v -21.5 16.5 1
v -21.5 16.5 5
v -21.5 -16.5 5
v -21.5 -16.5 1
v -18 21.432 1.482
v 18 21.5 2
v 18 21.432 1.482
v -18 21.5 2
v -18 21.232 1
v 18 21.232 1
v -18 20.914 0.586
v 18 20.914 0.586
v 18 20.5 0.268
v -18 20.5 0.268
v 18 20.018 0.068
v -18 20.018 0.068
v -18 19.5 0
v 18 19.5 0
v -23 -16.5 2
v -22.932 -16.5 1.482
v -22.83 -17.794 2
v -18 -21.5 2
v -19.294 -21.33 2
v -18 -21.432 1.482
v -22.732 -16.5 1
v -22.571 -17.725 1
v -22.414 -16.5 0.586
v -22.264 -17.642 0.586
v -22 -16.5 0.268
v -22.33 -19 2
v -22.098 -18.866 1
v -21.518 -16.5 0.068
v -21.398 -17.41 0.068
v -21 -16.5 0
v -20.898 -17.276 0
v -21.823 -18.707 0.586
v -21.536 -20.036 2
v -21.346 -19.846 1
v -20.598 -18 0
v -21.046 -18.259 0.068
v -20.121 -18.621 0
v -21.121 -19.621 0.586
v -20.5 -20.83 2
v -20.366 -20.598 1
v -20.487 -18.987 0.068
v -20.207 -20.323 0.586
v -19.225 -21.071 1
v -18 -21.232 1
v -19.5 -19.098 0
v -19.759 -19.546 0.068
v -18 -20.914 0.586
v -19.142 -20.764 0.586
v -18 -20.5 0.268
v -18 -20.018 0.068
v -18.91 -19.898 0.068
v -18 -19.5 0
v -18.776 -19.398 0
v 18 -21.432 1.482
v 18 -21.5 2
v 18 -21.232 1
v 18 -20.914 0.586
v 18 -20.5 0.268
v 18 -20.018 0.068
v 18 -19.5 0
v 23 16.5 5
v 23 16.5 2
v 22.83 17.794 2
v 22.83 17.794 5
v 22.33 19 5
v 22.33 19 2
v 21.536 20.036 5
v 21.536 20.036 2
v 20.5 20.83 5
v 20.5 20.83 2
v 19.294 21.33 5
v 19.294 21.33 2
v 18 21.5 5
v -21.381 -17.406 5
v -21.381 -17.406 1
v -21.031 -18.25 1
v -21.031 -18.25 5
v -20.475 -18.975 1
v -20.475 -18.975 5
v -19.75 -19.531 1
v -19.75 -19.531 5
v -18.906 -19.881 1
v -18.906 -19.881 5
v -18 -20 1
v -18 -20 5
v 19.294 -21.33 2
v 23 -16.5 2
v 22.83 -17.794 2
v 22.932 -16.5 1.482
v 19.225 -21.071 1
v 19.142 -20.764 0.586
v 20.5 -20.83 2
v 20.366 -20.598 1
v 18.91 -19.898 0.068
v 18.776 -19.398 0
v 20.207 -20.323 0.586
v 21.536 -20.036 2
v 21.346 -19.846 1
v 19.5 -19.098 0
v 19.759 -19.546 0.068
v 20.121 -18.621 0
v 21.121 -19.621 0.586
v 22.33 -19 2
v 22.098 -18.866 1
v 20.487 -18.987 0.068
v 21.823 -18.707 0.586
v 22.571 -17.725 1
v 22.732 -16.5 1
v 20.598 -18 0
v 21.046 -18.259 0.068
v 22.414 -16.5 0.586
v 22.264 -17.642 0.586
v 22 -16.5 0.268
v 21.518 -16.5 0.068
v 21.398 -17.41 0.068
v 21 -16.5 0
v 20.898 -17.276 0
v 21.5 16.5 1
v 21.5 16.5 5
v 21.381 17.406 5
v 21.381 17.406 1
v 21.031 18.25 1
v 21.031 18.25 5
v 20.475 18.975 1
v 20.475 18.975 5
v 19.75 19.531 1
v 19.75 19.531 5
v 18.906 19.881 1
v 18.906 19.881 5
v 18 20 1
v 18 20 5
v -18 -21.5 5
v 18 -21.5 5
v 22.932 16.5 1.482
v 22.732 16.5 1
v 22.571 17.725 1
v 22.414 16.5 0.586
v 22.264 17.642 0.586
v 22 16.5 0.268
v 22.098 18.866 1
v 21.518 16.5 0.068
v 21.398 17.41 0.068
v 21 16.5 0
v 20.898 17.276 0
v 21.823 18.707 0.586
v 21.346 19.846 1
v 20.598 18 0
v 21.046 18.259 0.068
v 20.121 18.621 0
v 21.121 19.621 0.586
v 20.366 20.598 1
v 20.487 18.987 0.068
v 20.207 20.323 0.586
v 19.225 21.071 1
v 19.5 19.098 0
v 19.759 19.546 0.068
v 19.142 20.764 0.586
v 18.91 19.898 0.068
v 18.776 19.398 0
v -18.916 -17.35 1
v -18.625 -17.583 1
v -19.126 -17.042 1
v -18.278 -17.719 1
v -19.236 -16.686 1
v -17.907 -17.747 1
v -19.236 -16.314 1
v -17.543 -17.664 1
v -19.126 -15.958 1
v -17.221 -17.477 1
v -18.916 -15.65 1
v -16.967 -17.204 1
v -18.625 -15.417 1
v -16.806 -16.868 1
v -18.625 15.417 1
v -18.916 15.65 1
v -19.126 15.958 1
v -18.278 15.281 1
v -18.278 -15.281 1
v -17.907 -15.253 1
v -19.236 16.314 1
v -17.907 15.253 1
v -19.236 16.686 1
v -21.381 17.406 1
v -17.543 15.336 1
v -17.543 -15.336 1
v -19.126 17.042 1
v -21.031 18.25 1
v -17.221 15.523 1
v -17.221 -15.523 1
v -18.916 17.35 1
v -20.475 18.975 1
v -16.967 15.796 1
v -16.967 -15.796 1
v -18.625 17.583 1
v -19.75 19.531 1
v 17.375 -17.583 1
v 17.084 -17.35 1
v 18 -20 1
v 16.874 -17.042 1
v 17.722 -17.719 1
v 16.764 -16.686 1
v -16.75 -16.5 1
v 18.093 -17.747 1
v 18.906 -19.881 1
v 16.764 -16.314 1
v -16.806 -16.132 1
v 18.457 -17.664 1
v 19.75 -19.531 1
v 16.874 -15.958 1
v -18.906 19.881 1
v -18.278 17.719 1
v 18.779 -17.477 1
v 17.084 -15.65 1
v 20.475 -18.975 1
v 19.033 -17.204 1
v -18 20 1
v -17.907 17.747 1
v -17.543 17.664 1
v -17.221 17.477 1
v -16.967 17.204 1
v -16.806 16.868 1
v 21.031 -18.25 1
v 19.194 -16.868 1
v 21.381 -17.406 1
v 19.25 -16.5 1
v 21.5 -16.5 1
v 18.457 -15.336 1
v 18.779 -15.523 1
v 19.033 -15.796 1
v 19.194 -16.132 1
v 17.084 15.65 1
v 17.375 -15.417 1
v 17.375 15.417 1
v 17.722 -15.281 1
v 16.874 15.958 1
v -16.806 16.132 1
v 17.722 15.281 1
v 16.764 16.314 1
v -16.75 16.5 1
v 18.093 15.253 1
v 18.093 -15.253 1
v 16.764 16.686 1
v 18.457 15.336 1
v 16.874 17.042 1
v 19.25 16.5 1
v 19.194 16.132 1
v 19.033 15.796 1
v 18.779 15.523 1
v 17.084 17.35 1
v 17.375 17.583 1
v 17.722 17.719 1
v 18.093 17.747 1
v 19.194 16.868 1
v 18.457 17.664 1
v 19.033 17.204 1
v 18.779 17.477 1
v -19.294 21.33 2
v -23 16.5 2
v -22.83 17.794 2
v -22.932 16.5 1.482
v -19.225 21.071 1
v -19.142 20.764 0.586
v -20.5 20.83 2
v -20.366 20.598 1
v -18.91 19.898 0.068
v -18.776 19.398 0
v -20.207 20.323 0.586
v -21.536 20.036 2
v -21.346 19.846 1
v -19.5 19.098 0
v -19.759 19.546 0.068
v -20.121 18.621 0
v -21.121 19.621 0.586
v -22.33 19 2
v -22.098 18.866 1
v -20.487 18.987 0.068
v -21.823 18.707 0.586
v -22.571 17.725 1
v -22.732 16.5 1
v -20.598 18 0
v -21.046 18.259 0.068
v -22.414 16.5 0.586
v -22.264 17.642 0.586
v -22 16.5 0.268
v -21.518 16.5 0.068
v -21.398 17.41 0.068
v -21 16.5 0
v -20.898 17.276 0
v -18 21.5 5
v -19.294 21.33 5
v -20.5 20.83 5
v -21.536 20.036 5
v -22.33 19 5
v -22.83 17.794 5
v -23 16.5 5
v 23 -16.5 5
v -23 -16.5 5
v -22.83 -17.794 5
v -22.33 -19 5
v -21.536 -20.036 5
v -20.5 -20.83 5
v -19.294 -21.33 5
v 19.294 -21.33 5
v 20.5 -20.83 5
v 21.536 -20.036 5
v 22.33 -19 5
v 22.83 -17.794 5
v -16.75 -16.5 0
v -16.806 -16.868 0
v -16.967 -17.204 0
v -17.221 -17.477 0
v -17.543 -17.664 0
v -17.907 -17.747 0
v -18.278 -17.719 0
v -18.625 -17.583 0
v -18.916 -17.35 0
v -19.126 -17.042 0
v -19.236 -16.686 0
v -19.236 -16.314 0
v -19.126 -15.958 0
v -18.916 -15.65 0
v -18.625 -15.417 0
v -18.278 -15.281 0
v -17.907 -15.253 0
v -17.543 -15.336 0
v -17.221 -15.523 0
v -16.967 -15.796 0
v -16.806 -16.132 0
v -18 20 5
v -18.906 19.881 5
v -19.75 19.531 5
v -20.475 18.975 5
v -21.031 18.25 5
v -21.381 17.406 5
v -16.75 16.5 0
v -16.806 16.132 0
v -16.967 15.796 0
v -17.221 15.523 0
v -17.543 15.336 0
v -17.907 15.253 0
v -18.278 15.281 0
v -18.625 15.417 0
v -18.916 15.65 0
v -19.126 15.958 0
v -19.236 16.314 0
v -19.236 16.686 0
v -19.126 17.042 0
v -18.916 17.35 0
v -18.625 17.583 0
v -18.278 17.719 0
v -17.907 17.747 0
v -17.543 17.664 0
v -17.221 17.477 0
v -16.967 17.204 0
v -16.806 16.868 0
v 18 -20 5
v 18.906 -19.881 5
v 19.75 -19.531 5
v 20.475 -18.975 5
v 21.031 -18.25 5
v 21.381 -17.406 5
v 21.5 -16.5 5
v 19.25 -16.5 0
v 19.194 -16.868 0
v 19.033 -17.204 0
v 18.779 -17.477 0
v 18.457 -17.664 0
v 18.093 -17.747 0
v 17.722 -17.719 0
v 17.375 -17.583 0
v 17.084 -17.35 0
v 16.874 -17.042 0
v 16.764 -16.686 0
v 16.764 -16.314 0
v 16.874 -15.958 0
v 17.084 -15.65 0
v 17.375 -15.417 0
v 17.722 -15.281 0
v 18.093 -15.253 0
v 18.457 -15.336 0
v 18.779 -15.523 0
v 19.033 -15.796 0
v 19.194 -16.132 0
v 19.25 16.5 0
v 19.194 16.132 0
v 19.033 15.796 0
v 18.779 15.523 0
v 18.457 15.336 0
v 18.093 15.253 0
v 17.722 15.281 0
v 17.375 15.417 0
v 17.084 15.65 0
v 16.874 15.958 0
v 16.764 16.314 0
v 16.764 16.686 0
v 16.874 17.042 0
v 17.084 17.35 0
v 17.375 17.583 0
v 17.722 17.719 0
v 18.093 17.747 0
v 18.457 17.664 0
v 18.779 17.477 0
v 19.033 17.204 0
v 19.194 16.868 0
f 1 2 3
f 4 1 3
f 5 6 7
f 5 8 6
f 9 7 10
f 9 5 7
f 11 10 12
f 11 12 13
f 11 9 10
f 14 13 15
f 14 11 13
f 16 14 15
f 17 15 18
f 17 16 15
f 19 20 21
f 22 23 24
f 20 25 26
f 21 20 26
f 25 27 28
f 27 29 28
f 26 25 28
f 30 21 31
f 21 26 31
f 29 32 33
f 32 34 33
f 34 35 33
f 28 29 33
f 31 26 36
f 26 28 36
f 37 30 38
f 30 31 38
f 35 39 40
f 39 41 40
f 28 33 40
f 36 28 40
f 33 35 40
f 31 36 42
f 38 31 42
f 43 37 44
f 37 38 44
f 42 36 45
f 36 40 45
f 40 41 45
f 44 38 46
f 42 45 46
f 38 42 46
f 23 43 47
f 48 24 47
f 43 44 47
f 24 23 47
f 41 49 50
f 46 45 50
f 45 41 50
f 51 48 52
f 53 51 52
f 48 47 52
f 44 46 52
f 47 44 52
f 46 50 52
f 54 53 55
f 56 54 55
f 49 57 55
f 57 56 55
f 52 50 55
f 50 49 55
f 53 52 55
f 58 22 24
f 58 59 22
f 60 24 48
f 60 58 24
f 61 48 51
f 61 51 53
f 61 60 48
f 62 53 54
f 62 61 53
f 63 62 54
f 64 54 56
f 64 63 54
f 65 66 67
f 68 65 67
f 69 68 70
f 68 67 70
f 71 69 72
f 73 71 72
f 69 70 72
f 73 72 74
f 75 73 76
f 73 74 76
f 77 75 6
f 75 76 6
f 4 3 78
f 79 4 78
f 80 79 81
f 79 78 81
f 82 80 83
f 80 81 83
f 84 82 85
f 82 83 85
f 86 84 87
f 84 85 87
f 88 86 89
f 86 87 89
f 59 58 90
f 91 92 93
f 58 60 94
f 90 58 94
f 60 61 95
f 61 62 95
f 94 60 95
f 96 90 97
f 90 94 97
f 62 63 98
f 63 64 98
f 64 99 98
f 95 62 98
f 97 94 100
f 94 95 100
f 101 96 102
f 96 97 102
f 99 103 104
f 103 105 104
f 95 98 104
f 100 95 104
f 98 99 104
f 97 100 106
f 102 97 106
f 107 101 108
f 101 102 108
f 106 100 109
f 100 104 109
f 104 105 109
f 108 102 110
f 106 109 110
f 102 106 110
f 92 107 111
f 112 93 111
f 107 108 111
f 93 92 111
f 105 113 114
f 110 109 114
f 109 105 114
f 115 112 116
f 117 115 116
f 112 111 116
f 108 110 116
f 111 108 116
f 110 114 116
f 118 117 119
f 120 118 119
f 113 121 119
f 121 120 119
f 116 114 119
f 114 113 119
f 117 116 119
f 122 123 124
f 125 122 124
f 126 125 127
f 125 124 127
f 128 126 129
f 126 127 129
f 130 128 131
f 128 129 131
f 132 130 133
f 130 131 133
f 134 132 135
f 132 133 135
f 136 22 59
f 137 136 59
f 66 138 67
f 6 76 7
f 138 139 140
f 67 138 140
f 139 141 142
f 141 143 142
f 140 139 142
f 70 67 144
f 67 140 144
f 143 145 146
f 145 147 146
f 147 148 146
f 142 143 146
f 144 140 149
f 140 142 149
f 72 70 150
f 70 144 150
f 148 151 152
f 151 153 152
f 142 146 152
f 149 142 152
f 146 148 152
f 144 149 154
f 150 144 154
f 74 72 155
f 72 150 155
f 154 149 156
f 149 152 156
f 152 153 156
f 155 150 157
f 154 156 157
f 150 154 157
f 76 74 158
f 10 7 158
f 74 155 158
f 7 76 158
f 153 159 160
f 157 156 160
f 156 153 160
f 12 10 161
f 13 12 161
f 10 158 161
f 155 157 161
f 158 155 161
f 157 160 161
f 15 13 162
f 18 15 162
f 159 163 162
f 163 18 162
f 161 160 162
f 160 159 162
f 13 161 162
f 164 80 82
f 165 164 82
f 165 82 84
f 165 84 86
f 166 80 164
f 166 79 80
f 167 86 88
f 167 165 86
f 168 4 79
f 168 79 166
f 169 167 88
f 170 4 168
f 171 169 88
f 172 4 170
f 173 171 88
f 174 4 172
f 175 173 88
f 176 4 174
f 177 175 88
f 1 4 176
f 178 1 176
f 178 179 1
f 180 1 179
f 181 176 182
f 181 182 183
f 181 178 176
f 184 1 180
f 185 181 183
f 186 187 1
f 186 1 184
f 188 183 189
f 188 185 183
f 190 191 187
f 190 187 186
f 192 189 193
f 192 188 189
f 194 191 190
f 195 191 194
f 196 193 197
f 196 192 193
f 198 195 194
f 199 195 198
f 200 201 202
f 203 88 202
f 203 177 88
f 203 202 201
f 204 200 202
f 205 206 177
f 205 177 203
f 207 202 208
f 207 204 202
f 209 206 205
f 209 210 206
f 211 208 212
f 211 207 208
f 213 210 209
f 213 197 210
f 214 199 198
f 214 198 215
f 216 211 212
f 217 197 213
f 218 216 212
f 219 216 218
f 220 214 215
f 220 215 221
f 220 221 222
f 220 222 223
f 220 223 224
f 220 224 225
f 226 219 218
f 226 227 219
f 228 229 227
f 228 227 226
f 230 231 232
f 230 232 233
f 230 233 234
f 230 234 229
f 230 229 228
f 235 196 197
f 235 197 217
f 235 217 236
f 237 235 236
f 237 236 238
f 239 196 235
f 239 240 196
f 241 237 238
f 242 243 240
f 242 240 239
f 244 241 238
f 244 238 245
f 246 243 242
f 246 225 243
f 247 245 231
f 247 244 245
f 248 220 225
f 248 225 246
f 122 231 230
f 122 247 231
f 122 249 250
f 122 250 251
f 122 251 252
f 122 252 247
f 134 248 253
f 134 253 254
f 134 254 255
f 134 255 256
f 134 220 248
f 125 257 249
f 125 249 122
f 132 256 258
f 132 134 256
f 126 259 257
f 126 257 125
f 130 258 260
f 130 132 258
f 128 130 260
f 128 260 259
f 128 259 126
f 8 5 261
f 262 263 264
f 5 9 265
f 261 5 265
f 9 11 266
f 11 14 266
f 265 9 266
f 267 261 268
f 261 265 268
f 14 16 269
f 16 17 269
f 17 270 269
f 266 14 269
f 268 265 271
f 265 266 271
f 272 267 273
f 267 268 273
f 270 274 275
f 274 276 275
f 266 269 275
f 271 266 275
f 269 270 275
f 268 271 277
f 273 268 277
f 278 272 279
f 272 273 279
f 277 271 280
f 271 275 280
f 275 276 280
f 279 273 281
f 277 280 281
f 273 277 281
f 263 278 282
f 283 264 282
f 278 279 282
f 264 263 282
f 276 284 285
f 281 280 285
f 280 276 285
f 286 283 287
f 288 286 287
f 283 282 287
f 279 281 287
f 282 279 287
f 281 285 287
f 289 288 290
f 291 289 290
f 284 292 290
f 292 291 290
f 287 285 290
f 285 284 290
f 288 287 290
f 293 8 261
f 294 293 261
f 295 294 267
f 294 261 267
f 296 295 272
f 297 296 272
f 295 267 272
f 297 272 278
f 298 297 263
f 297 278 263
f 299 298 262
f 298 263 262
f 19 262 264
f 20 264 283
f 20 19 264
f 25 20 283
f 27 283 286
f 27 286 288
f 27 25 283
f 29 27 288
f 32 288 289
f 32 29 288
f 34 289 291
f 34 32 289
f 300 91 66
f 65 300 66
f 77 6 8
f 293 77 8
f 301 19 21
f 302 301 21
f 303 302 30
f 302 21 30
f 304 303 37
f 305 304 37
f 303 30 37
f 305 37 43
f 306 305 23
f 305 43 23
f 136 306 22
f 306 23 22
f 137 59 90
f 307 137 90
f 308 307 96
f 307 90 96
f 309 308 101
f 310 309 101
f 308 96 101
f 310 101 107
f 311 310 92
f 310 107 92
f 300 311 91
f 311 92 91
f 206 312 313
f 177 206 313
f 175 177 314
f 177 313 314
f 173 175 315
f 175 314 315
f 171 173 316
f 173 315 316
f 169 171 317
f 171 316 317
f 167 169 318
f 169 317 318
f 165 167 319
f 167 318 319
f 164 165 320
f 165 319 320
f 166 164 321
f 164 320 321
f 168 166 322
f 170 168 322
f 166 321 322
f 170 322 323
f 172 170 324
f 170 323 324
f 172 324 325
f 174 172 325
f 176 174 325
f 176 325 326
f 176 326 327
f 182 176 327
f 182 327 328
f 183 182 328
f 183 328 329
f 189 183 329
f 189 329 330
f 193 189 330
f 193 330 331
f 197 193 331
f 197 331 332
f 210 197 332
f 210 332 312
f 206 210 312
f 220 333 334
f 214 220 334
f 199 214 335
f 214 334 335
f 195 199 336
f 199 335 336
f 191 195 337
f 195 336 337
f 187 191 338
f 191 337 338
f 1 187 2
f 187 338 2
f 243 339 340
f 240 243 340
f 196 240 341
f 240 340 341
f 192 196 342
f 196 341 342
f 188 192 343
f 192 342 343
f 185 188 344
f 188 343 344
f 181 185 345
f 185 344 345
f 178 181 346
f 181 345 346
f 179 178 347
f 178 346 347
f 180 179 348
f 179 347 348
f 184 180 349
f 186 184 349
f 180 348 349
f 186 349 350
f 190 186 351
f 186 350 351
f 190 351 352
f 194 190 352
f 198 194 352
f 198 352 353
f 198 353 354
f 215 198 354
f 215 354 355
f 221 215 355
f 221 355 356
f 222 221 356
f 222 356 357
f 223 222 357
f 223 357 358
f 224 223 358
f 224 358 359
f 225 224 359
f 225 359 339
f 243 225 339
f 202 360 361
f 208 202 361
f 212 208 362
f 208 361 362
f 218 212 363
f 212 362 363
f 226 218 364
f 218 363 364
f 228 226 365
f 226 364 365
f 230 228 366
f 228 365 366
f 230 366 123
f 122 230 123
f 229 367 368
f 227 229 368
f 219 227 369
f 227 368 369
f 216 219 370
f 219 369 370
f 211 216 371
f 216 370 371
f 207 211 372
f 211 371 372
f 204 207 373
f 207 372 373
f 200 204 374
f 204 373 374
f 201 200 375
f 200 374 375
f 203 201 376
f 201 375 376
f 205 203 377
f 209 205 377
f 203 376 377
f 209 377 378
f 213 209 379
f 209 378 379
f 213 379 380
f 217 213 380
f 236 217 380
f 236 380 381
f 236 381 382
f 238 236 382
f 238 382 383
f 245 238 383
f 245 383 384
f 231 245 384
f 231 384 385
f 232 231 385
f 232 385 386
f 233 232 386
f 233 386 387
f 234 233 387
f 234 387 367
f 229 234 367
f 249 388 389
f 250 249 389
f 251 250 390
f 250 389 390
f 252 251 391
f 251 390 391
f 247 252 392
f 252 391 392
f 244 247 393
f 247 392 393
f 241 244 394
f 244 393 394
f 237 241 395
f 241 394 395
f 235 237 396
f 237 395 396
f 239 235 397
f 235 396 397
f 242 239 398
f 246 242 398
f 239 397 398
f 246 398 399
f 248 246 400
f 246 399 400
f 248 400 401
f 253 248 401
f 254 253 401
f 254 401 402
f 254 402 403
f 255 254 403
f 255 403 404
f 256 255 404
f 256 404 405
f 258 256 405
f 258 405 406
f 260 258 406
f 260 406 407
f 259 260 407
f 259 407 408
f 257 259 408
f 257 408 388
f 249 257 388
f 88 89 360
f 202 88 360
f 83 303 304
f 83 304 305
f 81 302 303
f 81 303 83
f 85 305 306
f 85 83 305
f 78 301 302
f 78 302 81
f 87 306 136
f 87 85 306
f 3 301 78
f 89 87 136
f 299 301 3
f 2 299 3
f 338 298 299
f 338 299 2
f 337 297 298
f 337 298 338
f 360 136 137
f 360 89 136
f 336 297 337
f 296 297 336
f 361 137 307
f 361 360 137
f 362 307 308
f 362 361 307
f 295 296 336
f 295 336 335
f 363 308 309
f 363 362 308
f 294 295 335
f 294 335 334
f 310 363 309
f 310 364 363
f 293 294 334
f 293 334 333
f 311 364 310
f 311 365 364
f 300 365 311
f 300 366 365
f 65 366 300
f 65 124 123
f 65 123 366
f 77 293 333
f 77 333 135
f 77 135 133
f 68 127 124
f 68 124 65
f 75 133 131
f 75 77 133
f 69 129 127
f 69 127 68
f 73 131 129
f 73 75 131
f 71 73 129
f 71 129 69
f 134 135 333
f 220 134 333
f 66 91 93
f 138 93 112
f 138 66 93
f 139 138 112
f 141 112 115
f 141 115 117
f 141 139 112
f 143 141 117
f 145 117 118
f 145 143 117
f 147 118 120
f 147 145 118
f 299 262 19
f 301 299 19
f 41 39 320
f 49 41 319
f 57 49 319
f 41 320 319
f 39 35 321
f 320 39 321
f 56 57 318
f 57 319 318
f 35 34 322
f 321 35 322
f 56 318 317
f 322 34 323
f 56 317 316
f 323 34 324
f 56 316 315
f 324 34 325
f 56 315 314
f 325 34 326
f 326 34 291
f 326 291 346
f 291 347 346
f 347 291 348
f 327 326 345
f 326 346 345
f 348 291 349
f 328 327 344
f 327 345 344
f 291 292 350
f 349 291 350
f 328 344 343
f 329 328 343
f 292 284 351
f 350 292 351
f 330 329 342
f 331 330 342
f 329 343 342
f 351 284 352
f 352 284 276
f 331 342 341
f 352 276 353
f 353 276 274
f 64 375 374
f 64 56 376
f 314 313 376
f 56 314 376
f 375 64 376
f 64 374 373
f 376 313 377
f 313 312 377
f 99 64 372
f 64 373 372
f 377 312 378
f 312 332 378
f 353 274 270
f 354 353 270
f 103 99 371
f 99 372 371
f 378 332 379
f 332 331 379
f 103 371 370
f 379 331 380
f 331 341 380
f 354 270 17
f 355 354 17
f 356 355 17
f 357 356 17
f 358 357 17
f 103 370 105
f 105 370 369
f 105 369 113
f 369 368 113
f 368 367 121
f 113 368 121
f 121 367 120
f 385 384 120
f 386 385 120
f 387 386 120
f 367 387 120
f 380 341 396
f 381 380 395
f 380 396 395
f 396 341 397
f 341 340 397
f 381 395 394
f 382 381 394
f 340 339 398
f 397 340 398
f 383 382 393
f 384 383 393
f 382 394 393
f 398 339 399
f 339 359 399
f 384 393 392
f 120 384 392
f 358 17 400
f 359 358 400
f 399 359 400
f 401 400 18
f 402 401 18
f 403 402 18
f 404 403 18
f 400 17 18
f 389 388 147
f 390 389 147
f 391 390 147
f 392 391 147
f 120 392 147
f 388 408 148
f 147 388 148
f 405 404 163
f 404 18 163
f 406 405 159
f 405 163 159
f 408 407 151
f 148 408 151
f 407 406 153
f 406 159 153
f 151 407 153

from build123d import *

# Parameters (mm, degrees)
F1_DEPTH = 5
F3_DEPTH = 4
F4_R     = 2
F5_R     = 1.25
F6_DEPTH = 5.001


with BuildPart() as f1:
    # F0 (on Top) → F1 (new body)
    with BuildSketch(Plane.XY):
        with BuildLine():
            Line((-18, -21.5), (18, -21.5))
            ThreePointArc((18, -21.5), (21.535534, -20.035534), (23, -16.5))
            Line((23, -16.5), (23, 16.5))
            ThreePointArc((23, 16.5), (21.535534, 20.035534), (18, 21.5))
            Line((18, 21.5), (-18, 21.5))
            ThreePointArc((-18, 21.5), (-21.535534, 20.035534), (-23, 16.5))
            Line((-23, 16.5), (-23, -16.5))
            ThreePointArc((-23, -16.5), (-21.535534, -20.035534), (-18, -21.5))
        make_face()
    extrude(amount=F1_DEPTH)

    # F2 (on face) → F3 (cut)
    with BuildSketch(Plane.XY.offset(5)):
        with BuildLine():
            Line((-18, -20), (18, -20))
            ThreePointArc((18, -20), (20.474874, -18.974874), (21.5, -16.5))
            Line((21.5, -16.5), (21.5, 16.5))
            ThreePointArc((21.5, 16.5), (20.474874, 18.974874), (18, 20))
            Line((18, 20), (-18, 20))
            ThreePointArc((-18, 20), (-20.474874, 18.974874), (-21.5, 16.5))
            Line((-21.5, 16.5), (-21.5, -16.5))
            ThreePointArc((-21.5, -16.5), (-20.474874, -18.974874), (-18, -20))
        make_face()
    extrude(amount=-F3_DEPTH, mode=Mode.SUBTRACT)

    # F4
    f4_edges = [f1.edges().sort_by_distance(p)[0] for p in [
        (-21.535534, -20.035534, 0),
        (0, -21.5, 0),
        (21.535534, -20.035534, 0),
        (23, 0, 0),
        (21.535534, 20.035534, 0),
        (0, 21.5, 0),
        (-21.535534, 20.035534, 0),
        (-23, 0, 0),
    ]]
    fillet(f4_edges, radius=F4_R)

    # F5 (on face) → F6 (cut, through all)
    with BuildSketch(Plane(origin=(0, 0, 0), x_dir=(1, 0, 0), z_dir=(0, 0, -1))):
        with Locations((-18, 16.5)):
            Circle(F5_R)
        with Locations((18, 16.5)):
            Circle(F5_R)
        with Locations((18, -16.5)):
            Circle(F5_R)
        with Locations((-18, -16.5)):
            Circle(F5_R)
    extrude(amount=-F6_DEPTH, mode=Mode.SUBTRACT)


solid = f1.part
